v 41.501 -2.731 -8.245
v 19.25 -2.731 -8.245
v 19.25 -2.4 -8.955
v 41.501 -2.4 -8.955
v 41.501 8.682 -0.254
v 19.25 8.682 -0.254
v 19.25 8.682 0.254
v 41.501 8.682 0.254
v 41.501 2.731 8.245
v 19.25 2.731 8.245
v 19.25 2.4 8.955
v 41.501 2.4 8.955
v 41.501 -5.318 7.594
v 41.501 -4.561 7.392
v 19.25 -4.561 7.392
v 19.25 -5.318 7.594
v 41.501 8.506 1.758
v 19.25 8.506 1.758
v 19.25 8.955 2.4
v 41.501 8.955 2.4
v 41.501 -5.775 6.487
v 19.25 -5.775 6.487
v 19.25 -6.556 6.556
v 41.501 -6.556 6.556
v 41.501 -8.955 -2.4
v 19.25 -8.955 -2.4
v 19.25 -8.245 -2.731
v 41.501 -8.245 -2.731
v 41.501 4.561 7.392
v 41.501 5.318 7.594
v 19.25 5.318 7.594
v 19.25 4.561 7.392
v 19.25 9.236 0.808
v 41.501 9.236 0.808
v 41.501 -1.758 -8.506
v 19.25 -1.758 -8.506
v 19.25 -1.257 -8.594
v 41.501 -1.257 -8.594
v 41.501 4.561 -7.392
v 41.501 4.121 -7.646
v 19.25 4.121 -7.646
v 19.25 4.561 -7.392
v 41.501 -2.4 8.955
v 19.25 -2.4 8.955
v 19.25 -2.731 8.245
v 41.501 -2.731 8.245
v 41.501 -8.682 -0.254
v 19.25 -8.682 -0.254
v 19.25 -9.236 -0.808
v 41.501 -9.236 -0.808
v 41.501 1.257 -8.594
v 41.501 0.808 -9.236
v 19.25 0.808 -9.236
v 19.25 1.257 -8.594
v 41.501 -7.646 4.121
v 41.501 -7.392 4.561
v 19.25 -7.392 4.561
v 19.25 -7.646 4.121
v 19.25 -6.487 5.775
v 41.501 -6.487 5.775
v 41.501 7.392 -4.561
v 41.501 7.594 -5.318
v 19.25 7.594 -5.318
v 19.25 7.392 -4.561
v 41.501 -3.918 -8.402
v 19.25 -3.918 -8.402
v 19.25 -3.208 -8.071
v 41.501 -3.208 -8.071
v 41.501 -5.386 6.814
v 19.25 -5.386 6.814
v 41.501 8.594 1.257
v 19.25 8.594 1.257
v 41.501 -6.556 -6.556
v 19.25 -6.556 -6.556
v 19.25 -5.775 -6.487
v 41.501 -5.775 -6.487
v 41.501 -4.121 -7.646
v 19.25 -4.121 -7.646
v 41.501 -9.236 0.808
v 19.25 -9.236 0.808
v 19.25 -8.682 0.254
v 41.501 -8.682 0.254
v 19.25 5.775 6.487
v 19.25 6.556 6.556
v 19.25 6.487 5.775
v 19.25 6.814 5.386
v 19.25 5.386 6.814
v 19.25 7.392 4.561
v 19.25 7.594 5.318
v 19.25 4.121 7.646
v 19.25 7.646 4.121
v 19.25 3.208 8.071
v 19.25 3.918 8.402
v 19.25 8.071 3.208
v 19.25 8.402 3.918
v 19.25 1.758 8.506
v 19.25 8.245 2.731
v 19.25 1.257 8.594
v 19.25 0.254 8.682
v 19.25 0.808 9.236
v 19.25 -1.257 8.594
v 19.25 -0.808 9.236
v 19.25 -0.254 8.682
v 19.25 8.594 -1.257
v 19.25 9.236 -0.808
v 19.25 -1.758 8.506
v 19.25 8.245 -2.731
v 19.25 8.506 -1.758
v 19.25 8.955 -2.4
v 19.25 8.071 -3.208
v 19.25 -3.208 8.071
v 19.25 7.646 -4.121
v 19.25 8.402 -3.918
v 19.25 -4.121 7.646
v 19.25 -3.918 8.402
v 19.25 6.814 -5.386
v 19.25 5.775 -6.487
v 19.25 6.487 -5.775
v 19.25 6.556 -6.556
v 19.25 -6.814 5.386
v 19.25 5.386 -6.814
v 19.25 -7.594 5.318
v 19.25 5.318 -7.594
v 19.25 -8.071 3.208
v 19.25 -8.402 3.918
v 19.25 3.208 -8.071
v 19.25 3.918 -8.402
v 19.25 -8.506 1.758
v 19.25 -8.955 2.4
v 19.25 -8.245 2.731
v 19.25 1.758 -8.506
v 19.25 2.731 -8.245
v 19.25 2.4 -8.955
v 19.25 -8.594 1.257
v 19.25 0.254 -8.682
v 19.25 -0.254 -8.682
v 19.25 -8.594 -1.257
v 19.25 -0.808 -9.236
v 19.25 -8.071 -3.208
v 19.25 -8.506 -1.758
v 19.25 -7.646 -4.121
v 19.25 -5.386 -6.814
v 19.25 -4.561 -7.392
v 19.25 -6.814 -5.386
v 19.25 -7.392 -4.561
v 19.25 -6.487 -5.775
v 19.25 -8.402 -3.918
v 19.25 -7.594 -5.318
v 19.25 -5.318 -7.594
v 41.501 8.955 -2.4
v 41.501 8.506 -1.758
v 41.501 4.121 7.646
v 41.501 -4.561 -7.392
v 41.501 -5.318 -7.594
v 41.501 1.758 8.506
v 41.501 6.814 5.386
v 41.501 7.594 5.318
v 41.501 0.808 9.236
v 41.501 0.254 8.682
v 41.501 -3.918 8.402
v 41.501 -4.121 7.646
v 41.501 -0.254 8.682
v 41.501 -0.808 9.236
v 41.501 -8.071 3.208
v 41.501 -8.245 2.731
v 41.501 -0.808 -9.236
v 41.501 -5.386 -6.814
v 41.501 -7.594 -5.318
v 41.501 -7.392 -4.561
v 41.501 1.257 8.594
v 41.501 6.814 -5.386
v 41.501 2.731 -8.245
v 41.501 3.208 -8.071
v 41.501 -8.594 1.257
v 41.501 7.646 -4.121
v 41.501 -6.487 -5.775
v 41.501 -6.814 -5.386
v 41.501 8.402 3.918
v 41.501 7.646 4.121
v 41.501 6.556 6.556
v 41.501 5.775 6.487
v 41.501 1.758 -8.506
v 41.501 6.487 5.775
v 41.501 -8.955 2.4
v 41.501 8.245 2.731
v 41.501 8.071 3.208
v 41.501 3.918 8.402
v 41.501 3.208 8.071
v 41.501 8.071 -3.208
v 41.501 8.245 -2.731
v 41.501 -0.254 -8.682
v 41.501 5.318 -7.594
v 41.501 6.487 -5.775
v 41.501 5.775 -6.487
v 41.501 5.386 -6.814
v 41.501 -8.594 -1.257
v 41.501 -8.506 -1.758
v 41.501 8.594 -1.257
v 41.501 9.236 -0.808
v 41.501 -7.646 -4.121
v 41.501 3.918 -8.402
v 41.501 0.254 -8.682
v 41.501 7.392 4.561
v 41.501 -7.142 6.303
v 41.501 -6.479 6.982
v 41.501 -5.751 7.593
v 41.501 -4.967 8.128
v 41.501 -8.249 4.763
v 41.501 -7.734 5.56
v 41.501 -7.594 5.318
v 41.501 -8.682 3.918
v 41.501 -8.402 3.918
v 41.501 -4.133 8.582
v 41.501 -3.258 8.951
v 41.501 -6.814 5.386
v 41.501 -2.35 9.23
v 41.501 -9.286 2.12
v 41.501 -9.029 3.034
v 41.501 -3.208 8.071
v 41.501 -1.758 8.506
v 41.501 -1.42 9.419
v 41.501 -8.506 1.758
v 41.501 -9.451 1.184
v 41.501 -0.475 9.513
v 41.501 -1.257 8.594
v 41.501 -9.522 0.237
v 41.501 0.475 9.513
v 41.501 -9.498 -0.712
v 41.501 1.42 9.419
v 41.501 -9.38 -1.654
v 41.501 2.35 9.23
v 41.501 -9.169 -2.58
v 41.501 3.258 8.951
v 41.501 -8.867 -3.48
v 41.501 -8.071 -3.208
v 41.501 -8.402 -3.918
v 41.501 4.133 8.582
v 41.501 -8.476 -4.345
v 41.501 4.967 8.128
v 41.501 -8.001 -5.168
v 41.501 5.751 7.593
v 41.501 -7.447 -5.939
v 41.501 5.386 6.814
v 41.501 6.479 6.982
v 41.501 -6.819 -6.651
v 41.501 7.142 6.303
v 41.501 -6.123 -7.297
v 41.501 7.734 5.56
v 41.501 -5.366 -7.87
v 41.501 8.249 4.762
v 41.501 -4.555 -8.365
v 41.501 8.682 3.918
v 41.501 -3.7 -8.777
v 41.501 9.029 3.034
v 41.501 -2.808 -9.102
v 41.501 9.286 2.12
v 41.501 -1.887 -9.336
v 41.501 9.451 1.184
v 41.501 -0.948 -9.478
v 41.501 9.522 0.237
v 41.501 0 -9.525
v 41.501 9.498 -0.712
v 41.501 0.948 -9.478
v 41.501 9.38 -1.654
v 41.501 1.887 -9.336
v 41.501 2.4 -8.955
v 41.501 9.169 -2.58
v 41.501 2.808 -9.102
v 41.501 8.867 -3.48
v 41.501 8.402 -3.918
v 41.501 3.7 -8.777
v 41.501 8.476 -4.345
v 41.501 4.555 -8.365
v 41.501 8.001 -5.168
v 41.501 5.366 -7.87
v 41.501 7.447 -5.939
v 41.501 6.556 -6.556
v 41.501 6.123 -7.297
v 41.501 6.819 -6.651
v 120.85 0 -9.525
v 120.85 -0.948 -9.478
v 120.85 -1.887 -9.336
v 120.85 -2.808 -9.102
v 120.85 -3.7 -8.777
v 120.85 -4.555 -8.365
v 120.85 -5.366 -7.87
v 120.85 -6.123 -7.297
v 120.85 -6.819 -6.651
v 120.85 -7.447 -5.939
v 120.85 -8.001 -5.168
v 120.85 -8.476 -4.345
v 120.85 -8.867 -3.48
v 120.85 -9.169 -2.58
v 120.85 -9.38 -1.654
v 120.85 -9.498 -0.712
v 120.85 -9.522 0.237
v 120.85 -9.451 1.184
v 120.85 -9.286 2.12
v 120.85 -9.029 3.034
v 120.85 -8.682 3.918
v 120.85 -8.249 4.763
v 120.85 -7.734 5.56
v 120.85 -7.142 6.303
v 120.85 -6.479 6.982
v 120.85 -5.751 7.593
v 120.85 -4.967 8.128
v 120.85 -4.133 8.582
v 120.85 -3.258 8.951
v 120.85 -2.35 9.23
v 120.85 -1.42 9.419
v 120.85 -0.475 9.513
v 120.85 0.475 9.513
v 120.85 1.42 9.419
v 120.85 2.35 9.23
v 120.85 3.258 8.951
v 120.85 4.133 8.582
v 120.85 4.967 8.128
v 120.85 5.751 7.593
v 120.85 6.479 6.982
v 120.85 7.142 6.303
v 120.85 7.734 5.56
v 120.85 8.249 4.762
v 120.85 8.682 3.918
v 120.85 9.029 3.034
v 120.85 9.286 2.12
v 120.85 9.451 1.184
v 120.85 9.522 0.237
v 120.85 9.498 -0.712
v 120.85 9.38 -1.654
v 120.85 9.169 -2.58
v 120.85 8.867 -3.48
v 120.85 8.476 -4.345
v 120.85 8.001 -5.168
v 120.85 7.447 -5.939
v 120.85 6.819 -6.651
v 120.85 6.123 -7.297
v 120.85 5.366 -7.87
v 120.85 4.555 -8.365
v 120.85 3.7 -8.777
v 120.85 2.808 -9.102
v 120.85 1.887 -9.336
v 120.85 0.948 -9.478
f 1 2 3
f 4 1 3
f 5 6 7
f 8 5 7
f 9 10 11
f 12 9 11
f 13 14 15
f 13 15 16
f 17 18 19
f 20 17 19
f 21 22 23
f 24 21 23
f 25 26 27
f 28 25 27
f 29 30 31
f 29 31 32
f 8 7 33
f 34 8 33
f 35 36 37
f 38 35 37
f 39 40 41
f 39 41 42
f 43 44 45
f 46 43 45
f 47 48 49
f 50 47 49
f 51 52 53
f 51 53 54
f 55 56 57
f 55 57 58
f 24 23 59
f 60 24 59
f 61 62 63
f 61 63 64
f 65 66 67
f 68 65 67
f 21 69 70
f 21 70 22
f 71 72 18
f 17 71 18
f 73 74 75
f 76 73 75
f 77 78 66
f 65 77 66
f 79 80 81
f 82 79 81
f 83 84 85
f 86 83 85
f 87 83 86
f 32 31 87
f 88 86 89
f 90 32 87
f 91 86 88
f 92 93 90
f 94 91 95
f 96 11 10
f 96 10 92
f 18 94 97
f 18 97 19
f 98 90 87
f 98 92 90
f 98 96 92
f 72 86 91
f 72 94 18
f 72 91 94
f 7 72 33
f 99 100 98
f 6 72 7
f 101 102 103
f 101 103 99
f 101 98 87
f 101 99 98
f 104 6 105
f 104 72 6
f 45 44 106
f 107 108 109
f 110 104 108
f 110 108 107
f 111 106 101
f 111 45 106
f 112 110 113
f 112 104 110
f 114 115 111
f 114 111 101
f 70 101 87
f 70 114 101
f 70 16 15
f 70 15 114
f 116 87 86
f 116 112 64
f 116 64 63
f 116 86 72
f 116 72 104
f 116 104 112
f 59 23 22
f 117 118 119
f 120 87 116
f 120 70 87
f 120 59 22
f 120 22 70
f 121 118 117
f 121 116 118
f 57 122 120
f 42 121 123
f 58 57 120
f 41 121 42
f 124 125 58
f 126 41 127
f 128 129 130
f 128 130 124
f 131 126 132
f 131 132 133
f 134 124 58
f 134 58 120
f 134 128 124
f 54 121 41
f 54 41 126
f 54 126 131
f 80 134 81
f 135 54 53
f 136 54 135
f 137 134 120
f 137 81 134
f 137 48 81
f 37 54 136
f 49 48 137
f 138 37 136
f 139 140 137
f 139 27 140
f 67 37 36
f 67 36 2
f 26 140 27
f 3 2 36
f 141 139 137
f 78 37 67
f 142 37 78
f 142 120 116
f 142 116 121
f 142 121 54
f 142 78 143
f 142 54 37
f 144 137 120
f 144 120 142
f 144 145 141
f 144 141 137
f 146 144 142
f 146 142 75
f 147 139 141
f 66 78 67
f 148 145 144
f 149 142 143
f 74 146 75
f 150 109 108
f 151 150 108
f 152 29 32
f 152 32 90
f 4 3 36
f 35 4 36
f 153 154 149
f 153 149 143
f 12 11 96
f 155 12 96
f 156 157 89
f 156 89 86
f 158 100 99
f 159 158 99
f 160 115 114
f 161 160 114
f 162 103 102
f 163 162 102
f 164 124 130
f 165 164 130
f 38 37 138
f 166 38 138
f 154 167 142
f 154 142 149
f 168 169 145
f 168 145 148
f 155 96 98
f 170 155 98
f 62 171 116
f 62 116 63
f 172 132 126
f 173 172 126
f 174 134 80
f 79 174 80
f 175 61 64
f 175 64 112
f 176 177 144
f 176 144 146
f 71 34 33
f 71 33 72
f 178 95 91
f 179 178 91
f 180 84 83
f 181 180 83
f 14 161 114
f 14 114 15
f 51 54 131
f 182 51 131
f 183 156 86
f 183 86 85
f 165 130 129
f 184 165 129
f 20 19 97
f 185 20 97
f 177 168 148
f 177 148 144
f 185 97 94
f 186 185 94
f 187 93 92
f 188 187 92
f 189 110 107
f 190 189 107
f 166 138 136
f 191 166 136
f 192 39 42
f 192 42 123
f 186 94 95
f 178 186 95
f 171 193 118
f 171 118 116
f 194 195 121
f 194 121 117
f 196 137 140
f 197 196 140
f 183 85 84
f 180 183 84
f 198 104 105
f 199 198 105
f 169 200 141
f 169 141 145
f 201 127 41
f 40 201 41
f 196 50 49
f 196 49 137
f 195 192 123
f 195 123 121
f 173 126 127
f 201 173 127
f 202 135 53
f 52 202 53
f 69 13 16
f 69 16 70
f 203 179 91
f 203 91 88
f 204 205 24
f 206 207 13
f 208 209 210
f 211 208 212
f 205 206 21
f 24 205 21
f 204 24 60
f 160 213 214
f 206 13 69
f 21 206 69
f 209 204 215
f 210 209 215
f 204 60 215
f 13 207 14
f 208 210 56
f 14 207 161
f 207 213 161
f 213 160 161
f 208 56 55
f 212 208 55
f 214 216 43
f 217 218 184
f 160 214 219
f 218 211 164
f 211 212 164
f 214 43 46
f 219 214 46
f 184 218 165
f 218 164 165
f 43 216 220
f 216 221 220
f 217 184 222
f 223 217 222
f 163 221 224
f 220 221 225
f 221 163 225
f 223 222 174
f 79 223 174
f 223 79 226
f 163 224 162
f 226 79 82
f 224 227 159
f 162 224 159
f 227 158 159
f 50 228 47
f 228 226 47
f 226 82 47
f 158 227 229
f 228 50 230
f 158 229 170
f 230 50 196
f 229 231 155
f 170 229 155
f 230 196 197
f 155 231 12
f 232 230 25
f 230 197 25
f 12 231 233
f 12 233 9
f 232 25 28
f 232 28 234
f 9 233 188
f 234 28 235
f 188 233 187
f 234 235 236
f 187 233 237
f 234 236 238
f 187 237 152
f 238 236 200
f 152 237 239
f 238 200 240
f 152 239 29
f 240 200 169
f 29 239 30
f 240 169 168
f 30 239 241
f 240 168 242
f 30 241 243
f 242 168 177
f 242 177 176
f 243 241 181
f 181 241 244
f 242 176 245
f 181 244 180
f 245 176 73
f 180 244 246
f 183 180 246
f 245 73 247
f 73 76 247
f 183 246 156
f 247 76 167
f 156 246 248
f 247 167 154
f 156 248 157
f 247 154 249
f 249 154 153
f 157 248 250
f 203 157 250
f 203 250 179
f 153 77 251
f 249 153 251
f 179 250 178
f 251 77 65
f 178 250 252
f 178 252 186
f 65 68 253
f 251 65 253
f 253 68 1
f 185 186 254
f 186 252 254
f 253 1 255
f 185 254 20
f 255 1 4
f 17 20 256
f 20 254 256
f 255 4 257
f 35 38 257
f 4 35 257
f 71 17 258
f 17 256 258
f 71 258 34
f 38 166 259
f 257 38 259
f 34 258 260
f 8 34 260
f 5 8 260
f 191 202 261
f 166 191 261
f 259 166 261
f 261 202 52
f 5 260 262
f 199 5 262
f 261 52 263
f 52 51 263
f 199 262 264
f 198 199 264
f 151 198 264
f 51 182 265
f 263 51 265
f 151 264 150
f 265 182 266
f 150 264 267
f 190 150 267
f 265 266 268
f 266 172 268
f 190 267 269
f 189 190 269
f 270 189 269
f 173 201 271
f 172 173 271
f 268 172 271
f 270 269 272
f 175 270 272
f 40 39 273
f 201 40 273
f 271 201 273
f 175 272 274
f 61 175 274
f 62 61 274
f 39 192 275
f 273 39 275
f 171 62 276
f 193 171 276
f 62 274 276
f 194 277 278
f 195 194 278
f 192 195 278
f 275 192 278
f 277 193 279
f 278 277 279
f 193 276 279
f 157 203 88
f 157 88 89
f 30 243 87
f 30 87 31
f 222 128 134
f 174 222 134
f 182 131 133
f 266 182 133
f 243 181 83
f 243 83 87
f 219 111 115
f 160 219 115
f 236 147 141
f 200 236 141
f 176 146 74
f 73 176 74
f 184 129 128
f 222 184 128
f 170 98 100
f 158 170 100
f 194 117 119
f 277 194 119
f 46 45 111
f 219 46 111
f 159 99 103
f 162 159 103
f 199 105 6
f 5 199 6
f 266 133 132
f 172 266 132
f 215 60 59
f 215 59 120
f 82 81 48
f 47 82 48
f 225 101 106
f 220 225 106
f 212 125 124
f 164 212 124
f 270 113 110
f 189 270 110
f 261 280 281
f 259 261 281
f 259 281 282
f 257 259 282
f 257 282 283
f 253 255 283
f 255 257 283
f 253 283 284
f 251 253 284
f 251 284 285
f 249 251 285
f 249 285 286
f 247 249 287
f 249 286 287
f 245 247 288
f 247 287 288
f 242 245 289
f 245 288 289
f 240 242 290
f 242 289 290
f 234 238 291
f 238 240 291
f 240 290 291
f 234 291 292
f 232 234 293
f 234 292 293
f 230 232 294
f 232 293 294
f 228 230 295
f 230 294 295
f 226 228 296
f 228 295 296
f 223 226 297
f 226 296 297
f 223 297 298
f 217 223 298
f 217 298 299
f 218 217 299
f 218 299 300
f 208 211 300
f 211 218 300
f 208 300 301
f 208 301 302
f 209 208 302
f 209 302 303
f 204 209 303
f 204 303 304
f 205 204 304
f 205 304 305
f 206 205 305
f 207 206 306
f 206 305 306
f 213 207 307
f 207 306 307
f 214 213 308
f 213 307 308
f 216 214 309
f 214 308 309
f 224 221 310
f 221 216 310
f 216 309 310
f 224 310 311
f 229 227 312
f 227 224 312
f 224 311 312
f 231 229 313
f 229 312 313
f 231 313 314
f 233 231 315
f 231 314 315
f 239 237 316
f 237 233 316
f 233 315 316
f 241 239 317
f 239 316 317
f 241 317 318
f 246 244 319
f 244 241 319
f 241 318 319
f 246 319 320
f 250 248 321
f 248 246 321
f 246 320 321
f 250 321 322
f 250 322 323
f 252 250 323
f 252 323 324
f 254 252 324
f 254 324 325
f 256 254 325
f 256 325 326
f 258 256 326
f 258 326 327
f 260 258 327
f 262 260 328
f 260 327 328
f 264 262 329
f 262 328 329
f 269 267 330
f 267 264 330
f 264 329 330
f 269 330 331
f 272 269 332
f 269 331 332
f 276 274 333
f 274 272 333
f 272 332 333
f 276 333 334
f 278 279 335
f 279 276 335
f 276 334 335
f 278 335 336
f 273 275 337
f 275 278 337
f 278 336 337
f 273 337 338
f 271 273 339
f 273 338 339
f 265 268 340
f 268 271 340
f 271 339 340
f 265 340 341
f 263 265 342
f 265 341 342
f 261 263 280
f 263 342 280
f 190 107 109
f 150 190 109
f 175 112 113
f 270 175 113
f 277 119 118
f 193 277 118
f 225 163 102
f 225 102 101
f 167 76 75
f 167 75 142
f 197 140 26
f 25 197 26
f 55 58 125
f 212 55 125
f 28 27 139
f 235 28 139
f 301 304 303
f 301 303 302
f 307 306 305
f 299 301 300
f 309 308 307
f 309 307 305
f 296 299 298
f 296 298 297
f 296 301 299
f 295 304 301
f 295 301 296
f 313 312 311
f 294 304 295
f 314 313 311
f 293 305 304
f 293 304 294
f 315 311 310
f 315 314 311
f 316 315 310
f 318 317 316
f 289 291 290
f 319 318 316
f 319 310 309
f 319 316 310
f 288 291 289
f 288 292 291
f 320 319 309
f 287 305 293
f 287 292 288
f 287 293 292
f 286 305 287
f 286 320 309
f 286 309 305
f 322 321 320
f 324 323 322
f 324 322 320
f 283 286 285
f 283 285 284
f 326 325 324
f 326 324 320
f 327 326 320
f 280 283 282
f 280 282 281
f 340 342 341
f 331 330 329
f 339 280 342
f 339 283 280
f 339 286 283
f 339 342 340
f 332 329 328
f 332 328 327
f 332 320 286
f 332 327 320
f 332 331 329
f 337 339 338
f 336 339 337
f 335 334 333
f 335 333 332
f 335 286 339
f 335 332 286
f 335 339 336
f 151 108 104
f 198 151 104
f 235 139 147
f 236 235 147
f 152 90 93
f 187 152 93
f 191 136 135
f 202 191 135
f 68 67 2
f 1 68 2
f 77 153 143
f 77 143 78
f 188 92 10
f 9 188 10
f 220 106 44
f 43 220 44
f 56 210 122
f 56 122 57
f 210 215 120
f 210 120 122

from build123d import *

# Parameters (mm, degrees)
SKETCH1_W           = 120.675
SKETCH1_H           = 1.5875
SKETCH6_R           = 7.9375
BOSS_EXTRUDE1_DEPTH = 101.6
SKETCH7_R           = 23.308025585
CUT_EXTRUDE3_DEPTH  = 19.075
SKETCH4_R           = 12.7
CUT_EXTRUDE4_DEPTH  = 41.50106


with BuildPart() as part:
    # Sketch1 → Revolve1 (revolve)
    with BuildSketch(Plane(origin=(0, 0, 0), x_dir=(1, 0, 0), z_dir=(0, 1, 0))):
        with Locations((79.5875, 8.73125)):
            Rectangle(SKETCH1_W, SKETCH1_H)
    revolve(axis=Axis((157.324, 0, 0), (-1, 0, 0)))

    # Sketch6 → Boss-Extrude1 (add)
    with BuildSketch(Plane.ZY.offset(-19.25)):
        with Locations(Location((0, 0, 0), (0, 0, 180))):
            Circle(SKETCH6_R)
    extrude(amount=-BOSS_EXTRUDE1_DEPTH)

    # Sketch7 → Cut-Extrude3 (cut)
    with BuildSketch(Plane(origin=(120.85, 0, 0), x_dir=(0, 0, -1), z_dir=(1, 0, 0))):
        Circle(SKETCH7_R)
    extrude(amount=CUT_EXTRUDE3_DEPTH, mode=Mode.SUBTRACT)

    # Sketch4 → Cut-Extrude4 (cut)
    with BuildSketch(Plane(origin=(0, 0, 0), x_dir=(0, 0, -1), z_dir=(1, 0, 0))):
        Circle(SKETCH4_R)
        Polygon((-9.235721046, 0.808020891), (-8.681700155, 0.254), (-8.681700155, -0.254), (-9.235721046, -0.808020891), (-8.593912259, -1.257420242), (-8.505698985, -1.75770258), (-8.955098336, -2.399511367), (-8.245002688, -2.730634406), (-8.071256455, -3.207998257), (-8.402379494, -3.918093905), (-7.645572882, -4.120879625), (-7.391572882, -4.56082053), (-7.594358603, -5.317627141), (-6.813836213, -5.385914002), (-6.487300108, -5.775064579), (-6.555586968, -6.555586968), (-5.775064579, -6.487300108), (-5.385914002, -6.813836213), (-5.317627141, -7.594358603), (-4.56082053, -7.391572882), (-4.120879625, -7.645572882), (-3.918093905, -8.402379494), (-3.207998257, -8.071256455), (-2.730634406, -8.245002688), (-2.399511367, -8.955098336), (-1.75770258, -8.505698985), (-1.257420242, -8.593912259), (-0.808020891, -9.235721046), (-0.254, -8.681700155), (0.254, -8.681700155), (0.808020891, -9.235721046), (1.257420242, -8.593912259), (1.75770258, -8.505698985), (2.399511367, -8.955098336), (2.730634406, -8.245002688), (3.207998257, -8.071256455), (3.918093905, -8.402379494), (4.120879625, -7.645572882), (4.56082053, -7.391572882), (5.317627141, -7.594358603), (5.385914002, -6.813836213), (5.775064579, -6.487300108), (6.555586968, -6.555586968), (6.487300108, -5.775064579), (6.813836213, -5.385914002), (7.594358603, -5.317627141), (7.391572882, -4.56082053), (7.645572882, -4.120879625), (8.402379494, -3.918093905), (8.071256455, -3.207998257), (8.245002688, -2.730634406), (8.955098336, -2.399511367), (8.505698985, -1.75770258), (8.593912259, -1.257420242), (9.235721046, -0.808020891), (8.681700155, -0.254), (8.681700155, 0.254), (9.235721046, 0.808020891), (8.593912259, 1.257420242), (8.505698985, 1.75770258), (8.955098336, 2.399511367), (8.245002688, 2.730634406), (8.071256455, 3.207998257), (8.402379494, 3.918093905), (7.645572882, 4.120879625), (7.391572882, 4.56082053), (7.594358603, 5.317627141), (6.813836213, 5.385914002), (6.487300108, 5.775064579), (6.555586968, 6.555586968), (5.775064579, 6.487300108), (5.385914002, 6.813836213), (5.317627141, 7.594358603), (4.56082053, 7.391572882), (4.120879625, 7.645572882), (3.918093905, 8.402379494), (3.207998257, 8.071256455), (2.730634406, 8.245002688), (2.399511367, 8.955098336), (1.75770258, 8.505698985), (1.257420242, 8.593912259), (0.808020891, 9.235721046), (0.254, 8.681700155), (-0.254, 8.681700155), (-0.808020891, 9.235721046), (-1.257420242, 8.593912259), (-1.75770258, 8.505698985), (-2.399511367, 8.955098336), (-2.730634406, 8.245002688), (-3.207998257, 8.071256455), (-3.918093905, 8.402379494), (-4.120879625, 7.645572882), (-4.56082053, 7.391572882), (-5.317627141, 7.594358603), (-5.385914002, 6.813836213), (-5.775064579, 6.487300108), (-6.555586968, 6.555586968), (-6.487300108, 5.775064579), (-6.813836213, 5.385914002), (-7.594358603, 5.317627141), (-7.391572882, 4.56082053), (-7.645572882, 4.120879625), (-8.402379494, 3.918093905), (-8.071256455, 3.207998257), (-8.245002688, 2.730634406), (-8.955098336, 2.399511367), (-8.505698985, 1.75770258), (-8.593912259, 1.257420242), align=None, mode=Mode.SUBTRACT)
    extrude(amount=CUT_EXTRUDE4_DEPTH, mode=Mode.SUBTRACT)


solid = part.part
